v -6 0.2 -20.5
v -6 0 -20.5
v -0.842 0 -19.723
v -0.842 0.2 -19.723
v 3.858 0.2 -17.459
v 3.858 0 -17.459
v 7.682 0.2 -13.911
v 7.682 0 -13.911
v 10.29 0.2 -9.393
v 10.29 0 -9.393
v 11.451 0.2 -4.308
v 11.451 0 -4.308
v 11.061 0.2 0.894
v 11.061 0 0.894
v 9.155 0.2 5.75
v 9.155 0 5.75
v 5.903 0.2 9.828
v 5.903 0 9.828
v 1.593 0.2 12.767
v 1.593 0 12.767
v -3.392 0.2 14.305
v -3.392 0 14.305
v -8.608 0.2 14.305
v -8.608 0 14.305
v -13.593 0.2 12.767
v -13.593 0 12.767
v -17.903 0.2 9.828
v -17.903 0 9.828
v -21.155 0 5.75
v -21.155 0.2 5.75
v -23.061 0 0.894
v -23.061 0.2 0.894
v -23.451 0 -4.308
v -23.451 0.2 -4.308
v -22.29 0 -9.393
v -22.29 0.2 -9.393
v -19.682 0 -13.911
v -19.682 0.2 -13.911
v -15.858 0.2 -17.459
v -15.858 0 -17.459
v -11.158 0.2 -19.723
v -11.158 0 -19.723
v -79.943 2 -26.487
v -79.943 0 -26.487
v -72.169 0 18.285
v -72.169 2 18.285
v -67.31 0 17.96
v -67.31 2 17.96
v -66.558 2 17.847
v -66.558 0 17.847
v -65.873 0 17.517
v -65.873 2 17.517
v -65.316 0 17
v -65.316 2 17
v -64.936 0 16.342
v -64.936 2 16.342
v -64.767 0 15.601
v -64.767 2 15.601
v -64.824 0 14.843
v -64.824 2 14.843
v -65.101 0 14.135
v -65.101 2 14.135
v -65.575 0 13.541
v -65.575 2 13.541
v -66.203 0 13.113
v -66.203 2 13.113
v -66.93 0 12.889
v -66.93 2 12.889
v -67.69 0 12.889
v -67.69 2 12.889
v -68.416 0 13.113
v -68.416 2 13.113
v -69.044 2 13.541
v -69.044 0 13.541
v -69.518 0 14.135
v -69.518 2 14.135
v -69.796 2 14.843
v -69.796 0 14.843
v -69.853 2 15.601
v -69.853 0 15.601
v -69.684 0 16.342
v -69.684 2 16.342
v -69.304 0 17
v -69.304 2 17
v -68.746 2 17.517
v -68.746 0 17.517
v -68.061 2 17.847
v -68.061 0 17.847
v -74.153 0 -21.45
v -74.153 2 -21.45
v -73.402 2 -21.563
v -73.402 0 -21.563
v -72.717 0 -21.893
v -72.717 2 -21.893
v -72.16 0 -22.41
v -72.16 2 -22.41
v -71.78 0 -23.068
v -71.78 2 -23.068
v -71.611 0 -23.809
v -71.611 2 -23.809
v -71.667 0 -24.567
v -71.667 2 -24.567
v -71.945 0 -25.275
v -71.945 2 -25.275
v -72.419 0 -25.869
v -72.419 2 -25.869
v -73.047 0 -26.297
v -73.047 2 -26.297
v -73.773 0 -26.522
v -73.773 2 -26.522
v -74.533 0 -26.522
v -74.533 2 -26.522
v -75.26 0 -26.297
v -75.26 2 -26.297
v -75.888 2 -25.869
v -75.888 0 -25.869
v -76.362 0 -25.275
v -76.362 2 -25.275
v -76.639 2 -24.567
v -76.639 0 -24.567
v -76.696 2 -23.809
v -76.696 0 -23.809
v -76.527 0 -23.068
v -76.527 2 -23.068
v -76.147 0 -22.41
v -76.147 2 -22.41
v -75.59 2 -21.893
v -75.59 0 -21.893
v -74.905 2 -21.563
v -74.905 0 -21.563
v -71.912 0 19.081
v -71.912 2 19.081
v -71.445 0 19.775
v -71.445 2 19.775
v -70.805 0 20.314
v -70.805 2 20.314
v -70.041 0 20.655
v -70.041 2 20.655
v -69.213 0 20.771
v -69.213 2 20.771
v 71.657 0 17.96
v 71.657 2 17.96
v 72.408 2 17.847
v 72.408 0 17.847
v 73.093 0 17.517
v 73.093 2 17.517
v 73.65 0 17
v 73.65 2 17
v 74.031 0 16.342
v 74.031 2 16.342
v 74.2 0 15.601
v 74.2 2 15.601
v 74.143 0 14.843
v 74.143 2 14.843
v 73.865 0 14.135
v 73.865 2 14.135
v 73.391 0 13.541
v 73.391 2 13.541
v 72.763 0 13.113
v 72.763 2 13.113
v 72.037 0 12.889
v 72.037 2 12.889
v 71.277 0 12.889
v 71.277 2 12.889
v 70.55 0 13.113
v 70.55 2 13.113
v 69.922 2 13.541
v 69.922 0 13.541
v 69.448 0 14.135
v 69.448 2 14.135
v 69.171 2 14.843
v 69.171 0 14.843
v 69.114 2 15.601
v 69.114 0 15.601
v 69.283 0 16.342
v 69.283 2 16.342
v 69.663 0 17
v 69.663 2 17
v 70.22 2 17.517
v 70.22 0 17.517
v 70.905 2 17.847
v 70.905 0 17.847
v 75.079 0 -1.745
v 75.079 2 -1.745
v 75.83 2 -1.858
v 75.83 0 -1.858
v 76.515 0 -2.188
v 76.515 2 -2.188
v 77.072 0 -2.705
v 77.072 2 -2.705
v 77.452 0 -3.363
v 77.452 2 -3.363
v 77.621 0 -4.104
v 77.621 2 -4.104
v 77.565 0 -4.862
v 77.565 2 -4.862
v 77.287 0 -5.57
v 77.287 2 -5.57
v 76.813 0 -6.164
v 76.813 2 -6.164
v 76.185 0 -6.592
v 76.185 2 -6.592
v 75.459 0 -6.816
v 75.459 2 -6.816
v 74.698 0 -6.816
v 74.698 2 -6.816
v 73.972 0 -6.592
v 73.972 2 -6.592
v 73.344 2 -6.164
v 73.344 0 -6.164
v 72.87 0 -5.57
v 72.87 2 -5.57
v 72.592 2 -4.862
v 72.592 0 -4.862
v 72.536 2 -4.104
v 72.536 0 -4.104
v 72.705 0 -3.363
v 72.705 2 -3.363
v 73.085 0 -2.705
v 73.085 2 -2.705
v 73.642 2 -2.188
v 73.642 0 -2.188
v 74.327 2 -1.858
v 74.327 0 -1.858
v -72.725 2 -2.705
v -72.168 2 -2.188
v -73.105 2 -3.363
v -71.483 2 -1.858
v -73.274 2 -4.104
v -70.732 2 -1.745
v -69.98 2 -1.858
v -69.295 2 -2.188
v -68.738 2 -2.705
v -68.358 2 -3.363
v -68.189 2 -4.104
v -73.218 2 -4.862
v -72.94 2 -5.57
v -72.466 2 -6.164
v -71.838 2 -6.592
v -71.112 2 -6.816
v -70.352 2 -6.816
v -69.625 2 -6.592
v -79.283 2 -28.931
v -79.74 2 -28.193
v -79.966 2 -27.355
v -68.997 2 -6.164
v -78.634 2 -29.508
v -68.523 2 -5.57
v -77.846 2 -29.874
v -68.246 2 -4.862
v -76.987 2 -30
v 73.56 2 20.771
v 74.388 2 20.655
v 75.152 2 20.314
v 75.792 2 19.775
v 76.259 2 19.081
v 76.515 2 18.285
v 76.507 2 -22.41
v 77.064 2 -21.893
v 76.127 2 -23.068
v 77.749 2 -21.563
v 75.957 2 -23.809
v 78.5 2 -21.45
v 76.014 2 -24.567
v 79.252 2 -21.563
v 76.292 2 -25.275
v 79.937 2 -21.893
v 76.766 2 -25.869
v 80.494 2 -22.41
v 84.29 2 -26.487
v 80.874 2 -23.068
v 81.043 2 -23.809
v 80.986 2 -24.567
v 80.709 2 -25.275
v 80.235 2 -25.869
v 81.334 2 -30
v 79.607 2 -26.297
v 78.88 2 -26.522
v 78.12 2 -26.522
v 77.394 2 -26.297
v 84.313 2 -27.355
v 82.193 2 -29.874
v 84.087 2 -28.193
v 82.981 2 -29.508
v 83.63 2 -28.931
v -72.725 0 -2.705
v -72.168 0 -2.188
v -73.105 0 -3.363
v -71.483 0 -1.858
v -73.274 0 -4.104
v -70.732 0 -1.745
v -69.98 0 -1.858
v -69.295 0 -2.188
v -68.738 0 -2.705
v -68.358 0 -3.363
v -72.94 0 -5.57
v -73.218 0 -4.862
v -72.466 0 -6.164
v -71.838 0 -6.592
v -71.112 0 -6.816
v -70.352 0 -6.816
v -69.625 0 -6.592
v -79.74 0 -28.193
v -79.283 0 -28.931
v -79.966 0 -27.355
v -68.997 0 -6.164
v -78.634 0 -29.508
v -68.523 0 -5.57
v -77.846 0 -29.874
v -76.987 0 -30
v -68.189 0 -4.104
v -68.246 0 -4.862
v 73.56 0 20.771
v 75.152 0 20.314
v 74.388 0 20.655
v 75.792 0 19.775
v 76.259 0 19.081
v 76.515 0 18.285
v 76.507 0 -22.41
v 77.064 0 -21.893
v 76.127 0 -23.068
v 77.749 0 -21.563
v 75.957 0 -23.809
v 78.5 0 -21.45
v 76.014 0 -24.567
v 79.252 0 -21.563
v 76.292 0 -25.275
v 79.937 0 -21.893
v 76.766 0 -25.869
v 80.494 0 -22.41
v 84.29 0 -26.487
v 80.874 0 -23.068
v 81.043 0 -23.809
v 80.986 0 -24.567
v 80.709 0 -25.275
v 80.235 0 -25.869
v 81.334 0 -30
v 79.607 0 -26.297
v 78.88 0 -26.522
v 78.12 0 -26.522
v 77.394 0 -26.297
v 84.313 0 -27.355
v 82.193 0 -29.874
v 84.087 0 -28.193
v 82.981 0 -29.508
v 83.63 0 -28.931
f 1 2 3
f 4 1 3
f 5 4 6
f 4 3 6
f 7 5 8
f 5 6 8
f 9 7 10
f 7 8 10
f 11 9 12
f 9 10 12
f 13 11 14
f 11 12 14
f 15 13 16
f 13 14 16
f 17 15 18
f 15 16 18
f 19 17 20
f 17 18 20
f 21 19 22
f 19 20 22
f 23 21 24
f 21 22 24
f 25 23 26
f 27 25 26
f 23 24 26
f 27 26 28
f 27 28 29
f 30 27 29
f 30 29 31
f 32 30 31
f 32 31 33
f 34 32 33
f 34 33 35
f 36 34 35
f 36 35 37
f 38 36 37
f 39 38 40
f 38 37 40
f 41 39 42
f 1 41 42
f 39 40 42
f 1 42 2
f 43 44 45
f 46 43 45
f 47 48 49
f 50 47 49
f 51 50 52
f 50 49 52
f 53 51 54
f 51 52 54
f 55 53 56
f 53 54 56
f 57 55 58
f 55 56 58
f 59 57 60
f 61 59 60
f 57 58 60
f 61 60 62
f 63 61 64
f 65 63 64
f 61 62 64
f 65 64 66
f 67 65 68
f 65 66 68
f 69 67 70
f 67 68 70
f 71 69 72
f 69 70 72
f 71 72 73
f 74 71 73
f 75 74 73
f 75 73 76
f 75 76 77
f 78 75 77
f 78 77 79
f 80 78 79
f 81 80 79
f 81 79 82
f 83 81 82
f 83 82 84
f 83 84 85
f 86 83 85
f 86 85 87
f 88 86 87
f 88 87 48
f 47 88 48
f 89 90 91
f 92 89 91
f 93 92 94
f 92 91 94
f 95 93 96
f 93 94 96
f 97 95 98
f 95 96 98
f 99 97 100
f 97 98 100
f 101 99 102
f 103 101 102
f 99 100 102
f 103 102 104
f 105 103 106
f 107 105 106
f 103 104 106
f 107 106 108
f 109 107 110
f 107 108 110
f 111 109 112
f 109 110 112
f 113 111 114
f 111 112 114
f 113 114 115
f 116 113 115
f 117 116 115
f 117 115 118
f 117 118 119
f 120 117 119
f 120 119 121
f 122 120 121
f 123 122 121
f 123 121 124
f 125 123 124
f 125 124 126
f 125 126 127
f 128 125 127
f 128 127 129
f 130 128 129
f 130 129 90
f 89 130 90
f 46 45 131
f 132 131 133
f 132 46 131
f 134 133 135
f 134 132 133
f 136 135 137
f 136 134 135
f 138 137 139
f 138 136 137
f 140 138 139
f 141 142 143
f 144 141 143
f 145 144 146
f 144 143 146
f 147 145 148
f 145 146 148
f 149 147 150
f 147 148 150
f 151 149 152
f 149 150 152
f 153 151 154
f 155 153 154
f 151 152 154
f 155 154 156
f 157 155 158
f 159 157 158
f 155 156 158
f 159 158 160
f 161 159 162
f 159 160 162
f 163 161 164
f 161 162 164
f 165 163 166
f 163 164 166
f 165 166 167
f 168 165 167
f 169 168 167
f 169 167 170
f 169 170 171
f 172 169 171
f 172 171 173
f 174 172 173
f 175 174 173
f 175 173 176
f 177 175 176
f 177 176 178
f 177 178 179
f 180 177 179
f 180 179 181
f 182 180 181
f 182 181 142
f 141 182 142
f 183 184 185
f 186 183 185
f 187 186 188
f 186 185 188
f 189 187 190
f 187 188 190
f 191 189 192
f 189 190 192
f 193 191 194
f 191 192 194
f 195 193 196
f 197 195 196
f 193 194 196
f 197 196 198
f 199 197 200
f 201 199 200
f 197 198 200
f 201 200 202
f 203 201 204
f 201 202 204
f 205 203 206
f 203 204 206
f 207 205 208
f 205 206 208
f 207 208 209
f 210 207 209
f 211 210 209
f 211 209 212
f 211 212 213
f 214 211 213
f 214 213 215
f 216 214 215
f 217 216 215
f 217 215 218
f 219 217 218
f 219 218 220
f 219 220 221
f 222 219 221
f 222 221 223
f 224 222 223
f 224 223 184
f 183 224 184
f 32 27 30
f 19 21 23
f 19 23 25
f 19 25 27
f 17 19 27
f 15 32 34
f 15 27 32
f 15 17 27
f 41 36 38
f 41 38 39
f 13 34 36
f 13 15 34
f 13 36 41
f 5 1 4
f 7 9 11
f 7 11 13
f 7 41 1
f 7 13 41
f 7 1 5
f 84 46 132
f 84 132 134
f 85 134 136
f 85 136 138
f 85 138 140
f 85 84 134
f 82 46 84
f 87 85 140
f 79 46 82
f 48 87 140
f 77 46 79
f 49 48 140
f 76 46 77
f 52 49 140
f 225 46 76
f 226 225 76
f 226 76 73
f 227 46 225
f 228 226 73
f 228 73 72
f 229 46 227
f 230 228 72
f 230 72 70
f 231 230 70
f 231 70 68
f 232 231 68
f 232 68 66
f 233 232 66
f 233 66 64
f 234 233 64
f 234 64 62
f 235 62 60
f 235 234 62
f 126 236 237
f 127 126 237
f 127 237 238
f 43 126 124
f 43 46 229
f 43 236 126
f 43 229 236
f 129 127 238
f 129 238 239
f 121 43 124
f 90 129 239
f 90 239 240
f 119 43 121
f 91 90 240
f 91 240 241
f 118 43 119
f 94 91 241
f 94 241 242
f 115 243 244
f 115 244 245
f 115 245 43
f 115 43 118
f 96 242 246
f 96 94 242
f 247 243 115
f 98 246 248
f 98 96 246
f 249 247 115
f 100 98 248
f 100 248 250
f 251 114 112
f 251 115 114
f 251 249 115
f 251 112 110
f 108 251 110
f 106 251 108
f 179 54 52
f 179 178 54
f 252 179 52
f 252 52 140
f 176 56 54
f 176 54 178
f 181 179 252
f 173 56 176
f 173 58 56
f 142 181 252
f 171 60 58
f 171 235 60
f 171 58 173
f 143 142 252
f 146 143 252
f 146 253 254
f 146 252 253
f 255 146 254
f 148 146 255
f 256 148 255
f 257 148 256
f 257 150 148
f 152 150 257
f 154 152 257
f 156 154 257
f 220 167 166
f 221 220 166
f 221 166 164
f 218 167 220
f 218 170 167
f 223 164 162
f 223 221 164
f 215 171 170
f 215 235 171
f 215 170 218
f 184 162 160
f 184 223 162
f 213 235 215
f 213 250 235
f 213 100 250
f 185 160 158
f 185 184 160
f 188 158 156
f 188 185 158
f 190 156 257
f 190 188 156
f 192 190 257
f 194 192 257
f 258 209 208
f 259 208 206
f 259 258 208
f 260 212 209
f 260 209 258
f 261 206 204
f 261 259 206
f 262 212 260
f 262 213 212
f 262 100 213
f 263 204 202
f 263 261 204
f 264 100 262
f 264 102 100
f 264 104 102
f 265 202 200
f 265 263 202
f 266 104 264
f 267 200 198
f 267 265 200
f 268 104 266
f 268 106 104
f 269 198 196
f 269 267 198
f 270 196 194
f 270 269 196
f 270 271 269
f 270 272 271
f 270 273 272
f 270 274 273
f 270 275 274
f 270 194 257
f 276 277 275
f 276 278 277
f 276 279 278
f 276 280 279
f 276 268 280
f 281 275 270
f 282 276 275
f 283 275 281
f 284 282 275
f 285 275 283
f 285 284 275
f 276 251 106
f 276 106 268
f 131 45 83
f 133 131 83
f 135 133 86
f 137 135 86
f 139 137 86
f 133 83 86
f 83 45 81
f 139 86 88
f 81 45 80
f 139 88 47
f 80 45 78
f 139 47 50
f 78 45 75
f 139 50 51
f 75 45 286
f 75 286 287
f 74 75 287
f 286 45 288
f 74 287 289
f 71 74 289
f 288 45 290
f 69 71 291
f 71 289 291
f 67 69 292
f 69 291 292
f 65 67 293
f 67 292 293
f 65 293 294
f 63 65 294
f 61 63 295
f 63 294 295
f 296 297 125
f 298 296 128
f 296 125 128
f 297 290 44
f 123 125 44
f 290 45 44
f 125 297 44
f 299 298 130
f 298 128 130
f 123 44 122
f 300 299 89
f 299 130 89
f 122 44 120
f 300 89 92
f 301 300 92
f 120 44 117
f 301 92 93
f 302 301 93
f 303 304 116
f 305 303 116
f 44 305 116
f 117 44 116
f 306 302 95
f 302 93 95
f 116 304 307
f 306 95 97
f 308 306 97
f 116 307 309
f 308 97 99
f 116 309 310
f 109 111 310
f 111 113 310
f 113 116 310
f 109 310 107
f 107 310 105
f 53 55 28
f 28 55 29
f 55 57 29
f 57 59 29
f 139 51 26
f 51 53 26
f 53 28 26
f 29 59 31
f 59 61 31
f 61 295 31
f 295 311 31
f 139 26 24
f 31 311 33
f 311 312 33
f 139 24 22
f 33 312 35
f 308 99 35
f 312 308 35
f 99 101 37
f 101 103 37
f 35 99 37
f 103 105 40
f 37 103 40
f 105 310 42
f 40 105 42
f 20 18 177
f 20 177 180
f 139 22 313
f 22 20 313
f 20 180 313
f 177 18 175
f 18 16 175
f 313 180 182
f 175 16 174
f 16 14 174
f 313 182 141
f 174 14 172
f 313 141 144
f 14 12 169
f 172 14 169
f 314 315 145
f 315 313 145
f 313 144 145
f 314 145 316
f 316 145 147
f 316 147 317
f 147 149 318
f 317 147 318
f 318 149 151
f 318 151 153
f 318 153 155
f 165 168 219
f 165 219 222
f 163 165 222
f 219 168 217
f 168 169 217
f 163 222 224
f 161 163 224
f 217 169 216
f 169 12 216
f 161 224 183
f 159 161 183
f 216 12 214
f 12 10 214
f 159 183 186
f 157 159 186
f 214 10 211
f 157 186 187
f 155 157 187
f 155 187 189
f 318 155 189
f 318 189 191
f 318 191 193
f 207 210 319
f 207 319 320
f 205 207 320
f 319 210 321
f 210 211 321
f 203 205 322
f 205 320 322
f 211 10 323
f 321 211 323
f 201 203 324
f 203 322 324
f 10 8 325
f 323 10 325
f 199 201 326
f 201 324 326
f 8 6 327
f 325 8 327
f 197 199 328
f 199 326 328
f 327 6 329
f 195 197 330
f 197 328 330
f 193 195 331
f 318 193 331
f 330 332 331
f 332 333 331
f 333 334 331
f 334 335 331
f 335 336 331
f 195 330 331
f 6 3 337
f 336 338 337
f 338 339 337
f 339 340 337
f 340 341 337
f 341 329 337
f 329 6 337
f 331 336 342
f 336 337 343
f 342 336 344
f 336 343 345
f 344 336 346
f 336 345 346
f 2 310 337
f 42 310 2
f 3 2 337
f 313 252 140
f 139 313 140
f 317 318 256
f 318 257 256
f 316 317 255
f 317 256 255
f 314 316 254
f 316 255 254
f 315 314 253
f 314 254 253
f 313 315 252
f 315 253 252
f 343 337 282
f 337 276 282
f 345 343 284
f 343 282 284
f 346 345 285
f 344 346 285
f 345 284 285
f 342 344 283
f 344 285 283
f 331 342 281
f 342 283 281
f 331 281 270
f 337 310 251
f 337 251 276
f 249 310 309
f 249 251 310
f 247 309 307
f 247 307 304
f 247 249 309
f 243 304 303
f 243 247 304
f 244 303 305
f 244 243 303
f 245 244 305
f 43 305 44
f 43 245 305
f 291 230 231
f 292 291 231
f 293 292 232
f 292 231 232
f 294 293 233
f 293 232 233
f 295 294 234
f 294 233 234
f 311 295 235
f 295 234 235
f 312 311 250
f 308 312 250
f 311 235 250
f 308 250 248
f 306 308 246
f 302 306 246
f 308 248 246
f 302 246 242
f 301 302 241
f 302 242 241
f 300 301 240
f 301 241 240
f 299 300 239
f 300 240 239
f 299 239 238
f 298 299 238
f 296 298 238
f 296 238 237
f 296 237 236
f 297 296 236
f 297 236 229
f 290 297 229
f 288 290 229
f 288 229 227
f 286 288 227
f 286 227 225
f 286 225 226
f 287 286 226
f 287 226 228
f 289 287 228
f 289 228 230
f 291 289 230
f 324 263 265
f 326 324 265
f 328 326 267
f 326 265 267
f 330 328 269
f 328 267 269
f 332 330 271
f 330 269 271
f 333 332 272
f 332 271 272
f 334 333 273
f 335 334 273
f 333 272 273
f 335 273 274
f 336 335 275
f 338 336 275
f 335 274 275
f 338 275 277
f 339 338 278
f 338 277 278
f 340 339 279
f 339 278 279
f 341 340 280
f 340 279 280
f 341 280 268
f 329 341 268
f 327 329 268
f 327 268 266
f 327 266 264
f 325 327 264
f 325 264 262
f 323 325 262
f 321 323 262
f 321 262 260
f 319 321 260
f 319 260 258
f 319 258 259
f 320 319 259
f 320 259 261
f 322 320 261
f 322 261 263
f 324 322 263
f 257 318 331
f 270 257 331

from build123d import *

# Parameters (mm, degrees)
SKETCH_1_W          = 200
SKETCH_1_H          = 60
EXTRUDE_1_DEPTH     = 2
SKETCH_3_R          = 2.55
CUT_EXTRUDE_1_DEPTH = 105.422219858
CUT_EXTRUDE_2_DEPTH = 96.828733232
SKETCH_5_R          = 17.5
CUT_EXTRUDE_3_DEPTH = 0.2
FILLET_1_R          = 3


with BuildPart() as part:
    # 草图1 → 凸台-拉伸1 (new body)
    with BuildSketch(Plane(origin=(0, 0, 0), x_dir=(1, 0, 0), z_dir=(0, 1, 0))):
        Rectangle(SKETCH_1_W, SKETCH_1_H)
    extrude(amount=EXTRUDE_1_DEPTH)

    # 草图3 → 切除-拉伸1 (cut, through all)
    with BuildSketch(Plane(origin=(0, 2, 0), x_dir=(1, 0, 0), z_dir=(0, 1, 0))):
        Polygon((82.173464202, -20.771330594), (-77.826535798, -20.771330594), (-86.642884834, 30), (-100, 30), (-100, -30), (100, -30), (100, 30), (90.989813237, 30), align=None)
        with Locations(Location((-74.153372817, 24, 0), (0, 0, 270))):
            Circle(SKETCH_3_R)
        with Locations(Location((-70.731615422, 4.294884514, 0), (0, 0, 270))):
            Circle(SKETCH_3_R)
        with Locations(Location((-67.309858027, -15.410230973, 0), (0, 0, 270))):
            Circle(SKETCH_3_R)
        with Locations(Location((78.50030122, 24, 0), (0, 0, 270))):
            Circle(SKETCH_3_R)
        with Locations(Location((71.65678643, -15.410230973, 0), (0, 0, 270))):
            Circle(SKETCH_3_R)
        with Locations(Location((75.078543825, 4.294884514, 0), (0, 0, 270))):
            Circle(SKETCH_3_R)
    extrude(amount=-CUT_EXTRUDE_1_DEPTH, mode=Mode.SUBTRACT)

    # 草图4 → 切除-拉伸2 (cut, through all)
    with BuildSketch(Plane.XZ):
        Polygon((76.083674975, 20.771330594), (84.90002401, -30), (90.989813237, -30), (82.173464202, 20.771330594), align=None)
        Polygon((-86.642884834, -30), (-80.553095607, -30), (-71.736746572, 20.771330594), (-77.826535798, 20.771330594), align=None)
    extrude(amount=-CUT_EXTRUDE_2_DEPTH, mode=Mode.SUBTRACT)

    # 草图5 → 切除-拉伸3 (cut)
    with BuildSketch(Plane.XZ):
        with Locations(Location((-6, -3, 0), (0, 0, 270))):
            Circle(SKETCH_5_R)
    extrude(amount=-CUT_EXTRUDE_3_DEPTH, mode=Mode.SUBTRACT)

    # 圆角1
    fillet_1_edges = [part.edges().sort_by_distance(p)[0] for p in [
        (-80.553095607, 1, -30),
        (-71.736746572, 1, 20.771330594),
        (84.90002401, 1, -30),
        (76.083674975, 1, 20.771330594),
    ]]
    fillet(fillet_1_edges, radius=FILLET_1_R)


solid = part.part
